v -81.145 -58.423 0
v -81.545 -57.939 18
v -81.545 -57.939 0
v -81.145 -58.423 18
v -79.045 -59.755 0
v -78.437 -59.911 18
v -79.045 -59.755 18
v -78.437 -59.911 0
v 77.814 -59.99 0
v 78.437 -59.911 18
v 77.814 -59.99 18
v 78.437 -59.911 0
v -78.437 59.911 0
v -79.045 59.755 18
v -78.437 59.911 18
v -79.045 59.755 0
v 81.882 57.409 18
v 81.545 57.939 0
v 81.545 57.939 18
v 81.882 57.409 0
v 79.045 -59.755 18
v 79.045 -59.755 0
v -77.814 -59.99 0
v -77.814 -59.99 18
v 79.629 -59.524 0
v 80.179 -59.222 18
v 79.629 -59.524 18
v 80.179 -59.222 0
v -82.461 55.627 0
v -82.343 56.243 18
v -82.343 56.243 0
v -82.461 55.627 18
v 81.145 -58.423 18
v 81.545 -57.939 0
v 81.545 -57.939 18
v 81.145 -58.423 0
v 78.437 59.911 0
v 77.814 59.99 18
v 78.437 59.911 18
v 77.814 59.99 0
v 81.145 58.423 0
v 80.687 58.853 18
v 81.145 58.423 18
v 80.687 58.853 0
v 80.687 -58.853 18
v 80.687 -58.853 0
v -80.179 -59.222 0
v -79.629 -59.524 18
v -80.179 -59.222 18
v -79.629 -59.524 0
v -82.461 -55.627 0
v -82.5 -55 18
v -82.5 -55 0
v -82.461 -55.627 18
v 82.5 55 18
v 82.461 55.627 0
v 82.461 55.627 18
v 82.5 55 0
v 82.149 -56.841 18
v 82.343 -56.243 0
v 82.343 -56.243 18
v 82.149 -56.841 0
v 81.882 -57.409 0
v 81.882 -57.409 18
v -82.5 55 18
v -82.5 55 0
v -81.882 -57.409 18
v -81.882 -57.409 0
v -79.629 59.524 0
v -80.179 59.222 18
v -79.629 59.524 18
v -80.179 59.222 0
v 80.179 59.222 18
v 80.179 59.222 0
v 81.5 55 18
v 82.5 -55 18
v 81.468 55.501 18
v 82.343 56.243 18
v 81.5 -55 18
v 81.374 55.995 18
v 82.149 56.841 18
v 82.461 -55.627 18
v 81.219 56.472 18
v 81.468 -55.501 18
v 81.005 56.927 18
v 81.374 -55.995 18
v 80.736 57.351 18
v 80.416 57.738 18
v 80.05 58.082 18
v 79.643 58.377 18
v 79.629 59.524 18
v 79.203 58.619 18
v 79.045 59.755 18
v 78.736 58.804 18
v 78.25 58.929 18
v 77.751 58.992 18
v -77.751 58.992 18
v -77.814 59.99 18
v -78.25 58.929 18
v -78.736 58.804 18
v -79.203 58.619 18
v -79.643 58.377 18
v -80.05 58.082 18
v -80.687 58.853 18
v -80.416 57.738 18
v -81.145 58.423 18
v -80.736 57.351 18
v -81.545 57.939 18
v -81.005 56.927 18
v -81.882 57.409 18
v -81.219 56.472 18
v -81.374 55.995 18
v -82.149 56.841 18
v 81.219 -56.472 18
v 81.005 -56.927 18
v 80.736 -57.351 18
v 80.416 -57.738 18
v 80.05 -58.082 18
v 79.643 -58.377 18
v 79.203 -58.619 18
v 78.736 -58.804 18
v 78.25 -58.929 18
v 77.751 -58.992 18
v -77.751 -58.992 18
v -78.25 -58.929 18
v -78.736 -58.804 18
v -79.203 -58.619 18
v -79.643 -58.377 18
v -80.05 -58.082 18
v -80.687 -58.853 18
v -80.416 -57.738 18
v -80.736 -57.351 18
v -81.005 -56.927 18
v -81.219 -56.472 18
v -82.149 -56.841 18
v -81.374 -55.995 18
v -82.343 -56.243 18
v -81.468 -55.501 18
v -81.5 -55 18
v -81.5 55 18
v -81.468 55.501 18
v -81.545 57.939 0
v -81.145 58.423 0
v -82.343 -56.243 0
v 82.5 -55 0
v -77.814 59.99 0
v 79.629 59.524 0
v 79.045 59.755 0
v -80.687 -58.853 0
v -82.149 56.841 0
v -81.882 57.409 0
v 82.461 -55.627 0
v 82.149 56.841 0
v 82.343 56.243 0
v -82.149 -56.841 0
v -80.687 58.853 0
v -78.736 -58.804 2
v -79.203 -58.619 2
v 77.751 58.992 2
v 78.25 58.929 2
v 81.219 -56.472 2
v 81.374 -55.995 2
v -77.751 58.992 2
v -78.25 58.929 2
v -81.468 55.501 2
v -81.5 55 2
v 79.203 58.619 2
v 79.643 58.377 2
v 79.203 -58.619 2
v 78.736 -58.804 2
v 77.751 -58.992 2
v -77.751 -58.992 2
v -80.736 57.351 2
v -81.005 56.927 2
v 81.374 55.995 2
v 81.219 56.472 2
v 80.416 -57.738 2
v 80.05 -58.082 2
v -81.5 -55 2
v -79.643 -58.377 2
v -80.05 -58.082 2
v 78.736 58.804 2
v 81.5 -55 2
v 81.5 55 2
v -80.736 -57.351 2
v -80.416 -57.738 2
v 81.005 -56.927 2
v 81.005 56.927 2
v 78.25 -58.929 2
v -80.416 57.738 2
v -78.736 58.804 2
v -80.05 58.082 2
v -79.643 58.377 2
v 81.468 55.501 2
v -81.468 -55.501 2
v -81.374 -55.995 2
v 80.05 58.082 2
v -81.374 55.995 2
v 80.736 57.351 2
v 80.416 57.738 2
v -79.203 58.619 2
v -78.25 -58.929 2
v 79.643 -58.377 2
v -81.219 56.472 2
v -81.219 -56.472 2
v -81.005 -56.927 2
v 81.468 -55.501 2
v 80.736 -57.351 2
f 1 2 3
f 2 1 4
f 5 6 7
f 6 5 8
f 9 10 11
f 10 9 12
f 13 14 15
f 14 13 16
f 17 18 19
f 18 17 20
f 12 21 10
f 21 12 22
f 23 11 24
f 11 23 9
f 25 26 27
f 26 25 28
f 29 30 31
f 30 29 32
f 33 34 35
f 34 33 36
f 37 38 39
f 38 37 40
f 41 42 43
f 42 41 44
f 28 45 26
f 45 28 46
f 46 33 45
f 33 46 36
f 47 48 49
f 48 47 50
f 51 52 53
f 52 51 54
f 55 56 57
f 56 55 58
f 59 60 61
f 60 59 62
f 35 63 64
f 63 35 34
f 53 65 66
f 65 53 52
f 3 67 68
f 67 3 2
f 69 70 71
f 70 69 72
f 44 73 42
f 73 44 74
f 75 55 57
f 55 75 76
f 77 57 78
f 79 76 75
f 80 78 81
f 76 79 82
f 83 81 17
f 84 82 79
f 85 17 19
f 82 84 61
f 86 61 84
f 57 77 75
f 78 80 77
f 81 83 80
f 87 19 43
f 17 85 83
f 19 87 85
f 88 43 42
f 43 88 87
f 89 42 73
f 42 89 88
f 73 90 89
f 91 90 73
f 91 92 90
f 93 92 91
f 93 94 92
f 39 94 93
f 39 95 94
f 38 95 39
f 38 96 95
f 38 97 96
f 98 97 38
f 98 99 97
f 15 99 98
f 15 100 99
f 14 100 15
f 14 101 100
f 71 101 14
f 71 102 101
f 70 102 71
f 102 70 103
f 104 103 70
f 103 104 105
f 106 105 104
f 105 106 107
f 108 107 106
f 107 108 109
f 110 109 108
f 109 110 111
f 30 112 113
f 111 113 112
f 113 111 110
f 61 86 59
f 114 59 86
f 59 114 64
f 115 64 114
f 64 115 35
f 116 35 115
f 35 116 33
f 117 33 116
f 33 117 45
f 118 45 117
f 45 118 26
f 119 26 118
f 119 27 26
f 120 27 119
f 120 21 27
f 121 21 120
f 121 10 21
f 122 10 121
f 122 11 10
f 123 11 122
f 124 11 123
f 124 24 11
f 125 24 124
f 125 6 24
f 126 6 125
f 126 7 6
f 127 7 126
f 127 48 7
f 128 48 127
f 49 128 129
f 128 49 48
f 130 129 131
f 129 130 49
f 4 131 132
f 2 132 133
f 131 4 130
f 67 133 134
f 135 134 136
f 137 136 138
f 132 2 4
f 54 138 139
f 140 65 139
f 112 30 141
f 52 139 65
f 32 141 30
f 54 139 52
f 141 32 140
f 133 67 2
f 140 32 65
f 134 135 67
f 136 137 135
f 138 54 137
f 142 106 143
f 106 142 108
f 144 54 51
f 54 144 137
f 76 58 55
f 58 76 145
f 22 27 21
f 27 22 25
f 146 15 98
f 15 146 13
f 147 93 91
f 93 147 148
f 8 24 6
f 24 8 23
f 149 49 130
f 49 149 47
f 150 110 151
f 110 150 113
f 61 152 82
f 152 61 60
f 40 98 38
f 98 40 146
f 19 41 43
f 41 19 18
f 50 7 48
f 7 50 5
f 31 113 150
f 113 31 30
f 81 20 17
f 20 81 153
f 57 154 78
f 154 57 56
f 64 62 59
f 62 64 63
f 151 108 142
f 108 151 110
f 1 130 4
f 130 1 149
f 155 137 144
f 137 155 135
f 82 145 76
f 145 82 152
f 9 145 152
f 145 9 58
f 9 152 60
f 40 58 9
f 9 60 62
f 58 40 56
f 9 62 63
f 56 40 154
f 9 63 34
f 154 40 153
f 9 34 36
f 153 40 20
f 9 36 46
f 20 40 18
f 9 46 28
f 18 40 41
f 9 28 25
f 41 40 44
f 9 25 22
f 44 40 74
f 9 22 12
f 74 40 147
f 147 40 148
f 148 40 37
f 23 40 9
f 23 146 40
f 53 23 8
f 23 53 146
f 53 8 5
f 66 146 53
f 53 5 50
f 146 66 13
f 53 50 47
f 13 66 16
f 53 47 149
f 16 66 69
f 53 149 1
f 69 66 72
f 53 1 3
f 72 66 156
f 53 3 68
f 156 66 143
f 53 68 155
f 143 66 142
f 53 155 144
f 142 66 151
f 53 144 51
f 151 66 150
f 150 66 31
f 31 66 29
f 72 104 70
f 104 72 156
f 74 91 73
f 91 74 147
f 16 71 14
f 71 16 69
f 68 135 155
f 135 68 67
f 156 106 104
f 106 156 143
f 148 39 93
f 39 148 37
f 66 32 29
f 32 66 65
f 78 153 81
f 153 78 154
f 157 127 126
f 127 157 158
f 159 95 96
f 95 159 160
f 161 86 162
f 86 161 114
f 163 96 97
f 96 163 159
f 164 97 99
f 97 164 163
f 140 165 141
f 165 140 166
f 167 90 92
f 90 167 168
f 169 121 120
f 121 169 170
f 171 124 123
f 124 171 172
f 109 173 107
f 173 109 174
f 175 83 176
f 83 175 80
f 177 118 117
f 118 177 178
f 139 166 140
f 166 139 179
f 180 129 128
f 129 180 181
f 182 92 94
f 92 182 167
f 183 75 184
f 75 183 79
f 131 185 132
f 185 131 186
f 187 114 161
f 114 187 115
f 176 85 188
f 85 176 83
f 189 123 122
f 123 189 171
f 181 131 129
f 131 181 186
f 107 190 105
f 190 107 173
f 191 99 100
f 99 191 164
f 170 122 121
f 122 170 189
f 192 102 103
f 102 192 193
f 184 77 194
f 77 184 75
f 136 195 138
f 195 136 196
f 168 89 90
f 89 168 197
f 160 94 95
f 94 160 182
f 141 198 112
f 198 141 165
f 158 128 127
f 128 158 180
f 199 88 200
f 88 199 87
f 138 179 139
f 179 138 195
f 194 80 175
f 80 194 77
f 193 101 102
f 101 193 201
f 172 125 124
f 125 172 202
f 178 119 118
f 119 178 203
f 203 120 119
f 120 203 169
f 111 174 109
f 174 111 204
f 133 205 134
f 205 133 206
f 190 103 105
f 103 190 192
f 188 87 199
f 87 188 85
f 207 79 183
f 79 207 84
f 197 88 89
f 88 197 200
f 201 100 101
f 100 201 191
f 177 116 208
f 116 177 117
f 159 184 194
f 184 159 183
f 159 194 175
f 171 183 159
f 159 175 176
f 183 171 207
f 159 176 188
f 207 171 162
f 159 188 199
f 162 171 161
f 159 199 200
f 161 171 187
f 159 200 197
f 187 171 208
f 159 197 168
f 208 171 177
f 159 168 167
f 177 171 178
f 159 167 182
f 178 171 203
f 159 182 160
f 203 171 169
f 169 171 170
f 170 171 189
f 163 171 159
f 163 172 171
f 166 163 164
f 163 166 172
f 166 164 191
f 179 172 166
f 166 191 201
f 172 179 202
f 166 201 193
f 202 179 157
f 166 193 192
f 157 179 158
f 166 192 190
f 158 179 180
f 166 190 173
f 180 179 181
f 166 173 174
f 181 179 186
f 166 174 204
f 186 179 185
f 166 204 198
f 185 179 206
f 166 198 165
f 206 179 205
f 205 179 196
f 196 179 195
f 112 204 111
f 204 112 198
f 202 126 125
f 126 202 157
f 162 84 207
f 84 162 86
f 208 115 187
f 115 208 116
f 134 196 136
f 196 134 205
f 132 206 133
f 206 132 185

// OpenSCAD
$fn = 50;


difference() {
	union() {
		hull() {
			translate(v = [-77.5000000000, 55.0000000000, 0]) {
				cylinder(h = 18, r = 5);
			}
			translate(v = [77.5000000000, 55.0000000000, 0]) {
				cylinder(h = 18, r = 5);
			}
			translate(v = [-77.5000000000, -55.0000000000, 0]) {
				cylinder(h = 18, r = 5);
			}
			translate(v = [77.5000000000, -55.0000000000, 0]) {
				cylinder(h = 18, r = 5);
			}
		}
	}
	union() {
		translate(v = [0, 0, 2]) {
			hull() {
				translate(v = [-77.5000000000, 55.0000000000, 0]) {
					cylinder(h = 16, r = 4);
				}
				translate(v = [77.5000000000, 55.0000000000, 0]) {
					cylinder(h = 16, r = 4);
				}
				translate(v = [-77.5000000000, -55.0000000000, 0]) {
					cylinder(h = 16, r = 4);
				}
				translate(v = [77.5000000000, -55.0000000000, 0]) {
					cylinder(h = 16, r = 4);
				}
			}
		}
	}
}
